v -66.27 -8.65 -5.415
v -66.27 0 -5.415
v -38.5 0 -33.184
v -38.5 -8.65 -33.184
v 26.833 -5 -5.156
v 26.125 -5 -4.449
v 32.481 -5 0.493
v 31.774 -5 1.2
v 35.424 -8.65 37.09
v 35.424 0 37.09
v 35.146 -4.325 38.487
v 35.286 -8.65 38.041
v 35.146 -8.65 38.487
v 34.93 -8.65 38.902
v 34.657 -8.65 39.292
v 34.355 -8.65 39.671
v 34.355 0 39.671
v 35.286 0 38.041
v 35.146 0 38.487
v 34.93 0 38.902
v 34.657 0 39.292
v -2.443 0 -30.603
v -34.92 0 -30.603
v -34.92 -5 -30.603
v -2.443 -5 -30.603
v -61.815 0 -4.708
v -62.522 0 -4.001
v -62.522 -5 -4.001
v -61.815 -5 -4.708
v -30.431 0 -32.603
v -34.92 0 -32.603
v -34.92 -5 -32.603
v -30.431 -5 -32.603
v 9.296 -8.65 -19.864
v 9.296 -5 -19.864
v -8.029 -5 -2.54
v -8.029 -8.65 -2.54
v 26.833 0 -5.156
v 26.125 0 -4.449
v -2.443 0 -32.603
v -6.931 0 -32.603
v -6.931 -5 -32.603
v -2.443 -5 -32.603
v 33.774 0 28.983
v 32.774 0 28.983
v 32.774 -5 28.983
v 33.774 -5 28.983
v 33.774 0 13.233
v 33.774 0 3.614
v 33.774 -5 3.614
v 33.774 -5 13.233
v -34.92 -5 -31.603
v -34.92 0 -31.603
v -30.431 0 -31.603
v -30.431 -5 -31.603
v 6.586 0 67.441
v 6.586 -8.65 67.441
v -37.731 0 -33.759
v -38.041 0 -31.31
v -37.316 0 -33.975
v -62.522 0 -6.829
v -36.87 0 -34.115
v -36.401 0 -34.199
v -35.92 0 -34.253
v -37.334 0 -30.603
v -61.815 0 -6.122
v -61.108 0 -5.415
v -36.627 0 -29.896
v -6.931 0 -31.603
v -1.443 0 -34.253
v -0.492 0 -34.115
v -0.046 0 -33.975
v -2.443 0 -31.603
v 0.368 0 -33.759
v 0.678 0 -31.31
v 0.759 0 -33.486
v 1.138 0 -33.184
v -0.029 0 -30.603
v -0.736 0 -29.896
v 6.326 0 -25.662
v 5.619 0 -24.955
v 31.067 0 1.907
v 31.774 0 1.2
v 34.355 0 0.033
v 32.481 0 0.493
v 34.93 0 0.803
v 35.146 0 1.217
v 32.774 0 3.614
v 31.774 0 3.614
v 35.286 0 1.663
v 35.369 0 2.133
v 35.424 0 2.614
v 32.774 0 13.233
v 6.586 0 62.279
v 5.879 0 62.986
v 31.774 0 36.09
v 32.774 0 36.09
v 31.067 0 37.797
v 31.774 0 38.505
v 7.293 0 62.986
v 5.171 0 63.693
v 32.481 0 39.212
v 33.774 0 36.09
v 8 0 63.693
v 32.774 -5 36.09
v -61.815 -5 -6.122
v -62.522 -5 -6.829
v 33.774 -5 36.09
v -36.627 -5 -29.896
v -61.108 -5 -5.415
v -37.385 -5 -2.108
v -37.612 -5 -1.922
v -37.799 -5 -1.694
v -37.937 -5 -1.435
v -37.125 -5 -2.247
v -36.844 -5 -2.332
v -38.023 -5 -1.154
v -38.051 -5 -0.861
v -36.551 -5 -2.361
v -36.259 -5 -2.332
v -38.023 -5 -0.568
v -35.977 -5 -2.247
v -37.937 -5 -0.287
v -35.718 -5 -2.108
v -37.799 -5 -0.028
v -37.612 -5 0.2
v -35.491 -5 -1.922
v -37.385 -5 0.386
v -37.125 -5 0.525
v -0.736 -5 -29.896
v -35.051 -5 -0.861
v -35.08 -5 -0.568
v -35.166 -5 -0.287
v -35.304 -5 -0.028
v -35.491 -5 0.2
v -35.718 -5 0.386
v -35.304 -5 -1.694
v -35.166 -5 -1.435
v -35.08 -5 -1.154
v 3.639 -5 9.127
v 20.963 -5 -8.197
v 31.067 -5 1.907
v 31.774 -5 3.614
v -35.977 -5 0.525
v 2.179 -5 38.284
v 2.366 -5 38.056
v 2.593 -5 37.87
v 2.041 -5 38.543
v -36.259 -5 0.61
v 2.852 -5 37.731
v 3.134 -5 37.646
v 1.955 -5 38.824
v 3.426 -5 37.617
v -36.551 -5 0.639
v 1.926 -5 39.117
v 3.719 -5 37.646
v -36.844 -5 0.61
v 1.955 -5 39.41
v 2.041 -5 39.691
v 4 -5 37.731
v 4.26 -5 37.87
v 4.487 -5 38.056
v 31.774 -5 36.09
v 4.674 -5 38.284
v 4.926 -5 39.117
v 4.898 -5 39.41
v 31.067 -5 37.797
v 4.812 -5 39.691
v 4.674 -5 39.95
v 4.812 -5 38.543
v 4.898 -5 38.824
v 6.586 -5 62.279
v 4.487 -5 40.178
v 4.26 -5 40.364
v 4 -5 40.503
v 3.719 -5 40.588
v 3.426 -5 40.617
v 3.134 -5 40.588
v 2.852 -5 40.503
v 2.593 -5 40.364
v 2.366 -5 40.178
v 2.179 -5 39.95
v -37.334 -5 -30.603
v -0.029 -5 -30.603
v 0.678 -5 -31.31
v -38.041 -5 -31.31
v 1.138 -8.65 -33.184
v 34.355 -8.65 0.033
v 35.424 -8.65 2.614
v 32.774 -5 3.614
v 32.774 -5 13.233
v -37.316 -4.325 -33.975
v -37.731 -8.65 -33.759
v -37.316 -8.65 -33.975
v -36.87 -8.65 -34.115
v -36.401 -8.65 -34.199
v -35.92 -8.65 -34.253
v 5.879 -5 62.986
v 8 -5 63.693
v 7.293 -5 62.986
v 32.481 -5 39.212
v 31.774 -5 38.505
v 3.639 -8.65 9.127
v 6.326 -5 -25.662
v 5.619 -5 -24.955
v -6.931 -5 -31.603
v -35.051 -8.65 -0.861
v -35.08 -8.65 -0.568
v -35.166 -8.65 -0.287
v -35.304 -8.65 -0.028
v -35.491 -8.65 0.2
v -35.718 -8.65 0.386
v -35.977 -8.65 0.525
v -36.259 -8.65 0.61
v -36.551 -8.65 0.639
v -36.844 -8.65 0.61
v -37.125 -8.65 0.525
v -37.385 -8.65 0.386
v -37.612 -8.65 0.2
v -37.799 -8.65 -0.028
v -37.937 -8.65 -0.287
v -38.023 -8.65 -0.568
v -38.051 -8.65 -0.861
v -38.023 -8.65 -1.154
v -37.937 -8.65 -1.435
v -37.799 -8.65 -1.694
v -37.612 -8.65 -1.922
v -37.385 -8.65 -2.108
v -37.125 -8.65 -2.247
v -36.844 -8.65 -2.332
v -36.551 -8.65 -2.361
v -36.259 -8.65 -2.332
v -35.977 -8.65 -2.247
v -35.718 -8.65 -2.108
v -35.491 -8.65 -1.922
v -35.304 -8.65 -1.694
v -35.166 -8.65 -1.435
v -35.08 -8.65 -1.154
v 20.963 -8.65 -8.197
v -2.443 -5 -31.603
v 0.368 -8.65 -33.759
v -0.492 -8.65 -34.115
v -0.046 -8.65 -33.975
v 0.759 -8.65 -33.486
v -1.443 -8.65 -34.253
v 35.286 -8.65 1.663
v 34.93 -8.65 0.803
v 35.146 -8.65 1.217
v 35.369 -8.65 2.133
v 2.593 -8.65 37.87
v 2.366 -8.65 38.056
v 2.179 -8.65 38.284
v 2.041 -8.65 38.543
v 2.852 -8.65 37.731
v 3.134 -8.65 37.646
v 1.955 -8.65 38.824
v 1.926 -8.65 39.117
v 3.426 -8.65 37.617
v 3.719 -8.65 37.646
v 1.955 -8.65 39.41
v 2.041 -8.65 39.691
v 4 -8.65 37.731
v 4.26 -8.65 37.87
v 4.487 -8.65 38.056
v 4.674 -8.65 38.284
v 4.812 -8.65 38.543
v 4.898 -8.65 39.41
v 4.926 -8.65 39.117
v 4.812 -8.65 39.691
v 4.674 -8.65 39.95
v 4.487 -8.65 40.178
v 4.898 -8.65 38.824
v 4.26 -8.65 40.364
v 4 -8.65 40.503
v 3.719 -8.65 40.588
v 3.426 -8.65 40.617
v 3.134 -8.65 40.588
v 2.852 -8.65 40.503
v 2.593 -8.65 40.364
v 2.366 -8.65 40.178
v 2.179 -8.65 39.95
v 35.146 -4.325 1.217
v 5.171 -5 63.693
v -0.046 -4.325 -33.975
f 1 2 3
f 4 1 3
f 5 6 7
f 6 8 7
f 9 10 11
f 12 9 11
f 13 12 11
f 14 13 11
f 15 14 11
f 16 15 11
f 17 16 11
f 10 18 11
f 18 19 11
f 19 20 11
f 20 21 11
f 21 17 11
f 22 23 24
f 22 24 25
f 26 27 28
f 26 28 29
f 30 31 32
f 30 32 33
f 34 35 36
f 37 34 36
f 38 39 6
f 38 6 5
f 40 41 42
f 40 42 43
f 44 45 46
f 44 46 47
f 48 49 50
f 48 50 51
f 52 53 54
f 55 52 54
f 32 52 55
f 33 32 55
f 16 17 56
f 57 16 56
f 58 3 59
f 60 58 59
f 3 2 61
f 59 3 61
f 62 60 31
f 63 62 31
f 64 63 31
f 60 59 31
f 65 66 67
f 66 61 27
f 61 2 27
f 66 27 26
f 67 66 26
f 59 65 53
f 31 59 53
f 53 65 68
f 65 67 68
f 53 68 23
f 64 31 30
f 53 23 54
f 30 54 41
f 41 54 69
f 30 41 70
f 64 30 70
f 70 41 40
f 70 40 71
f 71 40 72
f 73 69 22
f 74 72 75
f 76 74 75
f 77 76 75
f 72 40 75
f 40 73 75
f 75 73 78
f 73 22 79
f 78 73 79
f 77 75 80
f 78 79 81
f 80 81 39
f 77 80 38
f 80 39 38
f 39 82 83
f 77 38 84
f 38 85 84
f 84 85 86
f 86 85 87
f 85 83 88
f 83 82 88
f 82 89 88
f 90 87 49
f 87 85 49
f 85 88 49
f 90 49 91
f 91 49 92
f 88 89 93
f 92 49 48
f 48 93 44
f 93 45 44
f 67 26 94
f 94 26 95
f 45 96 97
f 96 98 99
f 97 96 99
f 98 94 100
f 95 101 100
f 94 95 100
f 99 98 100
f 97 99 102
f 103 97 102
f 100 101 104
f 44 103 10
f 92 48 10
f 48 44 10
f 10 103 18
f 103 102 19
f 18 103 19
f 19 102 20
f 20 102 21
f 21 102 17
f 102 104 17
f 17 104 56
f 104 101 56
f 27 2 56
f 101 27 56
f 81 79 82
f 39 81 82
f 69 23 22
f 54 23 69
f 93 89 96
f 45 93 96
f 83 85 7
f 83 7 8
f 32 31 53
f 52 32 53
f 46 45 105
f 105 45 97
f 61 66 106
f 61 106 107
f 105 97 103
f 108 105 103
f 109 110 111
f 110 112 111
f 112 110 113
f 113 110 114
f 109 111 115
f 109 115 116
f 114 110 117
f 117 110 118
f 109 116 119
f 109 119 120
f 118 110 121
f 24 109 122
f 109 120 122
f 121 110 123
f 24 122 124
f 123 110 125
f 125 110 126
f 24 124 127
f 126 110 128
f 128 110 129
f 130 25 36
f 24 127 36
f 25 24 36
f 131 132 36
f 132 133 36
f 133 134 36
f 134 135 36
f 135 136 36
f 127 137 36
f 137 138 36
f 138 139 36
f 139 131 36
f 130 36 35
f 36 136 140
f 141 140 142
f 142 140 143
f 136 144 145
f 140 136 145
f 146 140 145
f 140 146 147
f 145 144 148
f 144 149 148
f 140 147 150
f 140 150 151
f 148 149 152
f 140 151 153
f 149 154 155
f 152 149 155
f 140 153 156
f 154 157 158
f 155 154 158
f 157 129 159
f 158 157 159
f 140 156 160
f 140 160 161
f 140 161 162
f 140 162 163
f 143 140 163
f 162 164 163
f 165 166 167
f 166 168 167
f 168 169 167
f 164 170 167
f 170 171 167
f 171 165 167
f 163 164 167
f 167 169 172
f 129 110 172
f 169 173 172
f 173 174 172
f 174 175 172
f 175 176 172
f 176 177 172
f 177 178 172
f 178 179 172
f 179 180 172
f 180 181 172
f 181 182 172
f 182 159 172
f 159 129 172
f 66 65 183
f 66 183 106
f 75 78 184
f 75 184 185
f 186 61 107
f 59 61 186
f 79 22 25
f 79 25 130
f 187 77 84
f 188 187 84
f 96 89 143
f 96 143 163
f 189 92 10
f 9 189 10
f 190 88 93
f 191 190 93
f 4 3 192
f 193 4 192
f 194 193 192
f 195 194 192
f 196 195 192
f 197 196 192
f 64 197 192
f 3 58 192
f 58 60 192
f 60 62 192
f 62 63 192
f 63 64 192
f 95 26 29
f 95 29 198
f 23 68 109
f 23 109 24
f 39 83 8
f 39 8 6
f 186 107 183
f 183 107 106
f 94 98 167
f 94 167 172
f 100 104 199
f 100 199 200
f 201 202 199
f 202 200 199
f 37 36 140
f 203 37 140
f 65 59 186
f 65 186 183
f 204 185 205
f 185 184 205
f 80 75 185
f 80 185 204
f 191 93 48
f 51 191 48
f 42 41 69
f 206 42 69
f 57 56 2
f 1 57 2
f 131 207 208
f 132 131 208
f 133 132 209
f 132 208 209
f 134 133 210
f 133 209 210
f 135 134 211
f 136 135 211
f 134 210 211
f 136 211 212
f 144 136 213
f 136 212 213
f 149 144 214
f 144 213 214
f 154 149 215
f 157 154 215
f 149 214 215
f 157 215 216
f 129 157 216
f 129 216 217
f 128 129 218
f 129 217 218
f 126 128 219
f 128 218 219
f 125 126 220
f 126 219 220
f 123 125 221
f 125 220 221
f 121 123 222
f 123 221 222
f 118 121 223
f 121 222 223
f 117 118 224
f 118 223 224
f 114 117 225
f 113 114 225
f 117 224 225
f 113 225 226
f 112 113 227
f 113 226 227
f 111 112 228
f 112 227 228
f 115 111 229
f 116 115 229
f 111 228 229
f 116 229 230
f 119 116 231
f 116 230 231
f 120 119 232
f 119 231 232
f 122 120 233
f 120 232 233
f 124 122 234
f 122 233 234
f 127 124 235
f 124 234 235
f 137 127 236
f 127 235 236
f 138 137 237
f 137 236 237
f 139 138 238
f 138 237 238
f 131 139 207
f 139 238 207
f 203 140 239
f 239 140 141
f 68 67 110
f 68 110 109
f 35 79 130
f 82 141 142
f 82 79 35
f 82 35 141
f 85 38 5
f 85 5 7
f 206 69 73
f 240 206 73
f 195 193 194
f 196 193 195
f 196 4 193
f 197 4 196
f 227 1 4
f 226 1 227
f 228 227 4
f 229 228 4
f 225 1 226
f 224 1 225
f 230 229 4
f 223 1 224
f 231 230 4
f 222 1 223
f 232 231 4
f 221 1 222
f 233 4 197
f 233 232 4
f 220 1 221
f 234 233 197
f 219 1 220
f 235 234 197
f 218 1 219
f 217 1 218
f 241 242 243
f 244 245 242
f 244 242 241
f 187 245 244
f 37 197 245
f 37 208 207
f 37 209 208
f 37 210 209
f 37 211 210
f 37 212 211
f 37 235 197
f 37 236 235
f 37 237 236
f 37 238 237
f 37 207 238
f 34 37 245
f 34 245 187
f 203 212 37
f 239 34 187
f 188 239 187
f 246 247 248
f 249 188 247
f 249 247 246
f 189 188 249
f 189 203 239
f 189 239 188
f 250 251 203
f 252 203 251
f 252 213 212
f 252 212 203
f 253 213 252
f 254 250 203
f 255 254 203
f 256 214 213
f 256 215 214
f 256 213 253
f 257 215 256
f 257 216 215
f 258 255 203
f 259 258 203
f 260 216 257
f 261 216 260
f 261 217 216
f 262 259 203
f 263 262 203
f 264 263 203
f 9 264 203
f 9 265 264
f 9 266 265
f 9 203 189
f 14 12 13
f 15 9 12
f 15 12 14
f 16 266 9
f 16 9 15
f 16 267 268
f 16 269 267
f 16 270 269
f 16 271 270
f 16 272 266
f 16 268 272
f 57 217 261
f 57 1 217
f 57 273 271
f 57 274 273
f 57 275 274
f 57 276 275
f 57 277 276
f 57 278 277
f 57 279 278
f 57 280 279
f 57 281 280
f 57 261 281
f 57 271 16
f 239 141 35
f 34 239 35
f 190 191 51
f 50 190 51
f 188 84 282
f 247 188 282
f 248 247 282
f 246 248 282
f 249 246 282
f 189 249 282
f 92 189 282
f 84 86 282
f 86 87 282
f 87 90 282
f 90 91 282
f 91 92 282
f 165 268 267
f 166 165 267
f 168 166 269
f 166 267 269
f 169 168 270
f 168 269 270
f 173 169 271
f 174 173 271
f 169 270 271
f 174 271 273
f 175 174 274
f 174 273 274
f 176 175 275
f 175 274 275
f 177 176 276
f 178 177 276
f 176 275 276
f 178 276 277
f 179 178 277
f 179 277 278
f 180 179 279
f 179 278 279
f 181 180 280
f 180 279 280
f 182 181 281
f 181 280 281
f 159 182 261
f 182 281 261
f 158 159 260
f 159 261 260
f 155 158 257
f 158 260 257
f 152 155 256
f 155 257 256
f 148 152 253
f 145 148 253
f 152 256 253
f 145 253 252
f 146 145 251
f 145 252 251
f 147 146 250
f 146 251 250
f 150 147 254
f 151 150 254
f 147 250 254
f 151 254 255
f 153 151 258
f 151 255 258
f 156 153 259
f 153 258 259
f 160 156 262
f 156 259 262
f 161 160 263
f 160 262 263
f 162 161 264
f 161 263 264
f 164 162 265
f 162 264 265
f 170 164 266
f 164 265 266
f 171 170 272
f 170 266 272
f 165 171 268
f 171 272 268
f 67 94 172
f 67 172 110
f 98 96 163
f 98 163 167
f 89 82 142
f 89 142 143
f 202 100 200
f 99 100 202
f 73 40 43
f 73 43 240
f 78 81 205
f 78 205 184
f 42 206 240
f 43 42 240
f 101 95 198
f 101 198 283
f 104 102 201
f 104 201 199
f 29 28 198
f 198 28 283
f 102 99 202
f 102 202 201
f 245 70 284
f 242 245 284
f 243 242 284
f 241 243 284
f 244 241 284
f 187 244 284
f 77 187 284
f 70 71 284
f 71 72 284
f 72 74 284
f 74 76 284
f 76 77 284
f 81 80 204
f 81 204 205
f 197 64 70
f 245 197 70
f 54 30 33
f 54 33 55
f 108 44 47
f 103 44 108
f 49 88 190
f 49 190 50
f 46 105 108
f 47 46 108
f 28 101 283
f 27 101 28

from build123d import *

# Parameters (mm, degrees)
F0_W     = 4.4881204973
F0_H     = 1
F0_W_2   = 1
F0_H_2   = 9.6190602487
F0_H_3   = 7.107180746
F1_DEPTH = 8.65
F2_DEPTH = 5
F3_DEPTH = 5
F5_DEPTH = 3.65
F6_R     = 1.5
F7_DEPTH = 3.65


with BuildPart() as f1:
    # F0 (on Front) → F1 (new body)
    with BuildSketch(Plane.XZ):
        with BuildLine():
            Line((34.3548780517, 39.6712920324), (6.5856519265, 67.4405181576))
            Line((6.5856519265, 67.4405181576), (-66.2696871329, -5.4148209018))
            Line((-66.2696871329, -5.4148209018), (-38.5004610077, -33.1840470269))
            add(Edge.make_bspline(
                [(-38.5004610077, -33.1840470269), (-38.1234667087, -33.490568944), (-37.3694781107, -34.1036127783), (-36.4028402078, -34.2032757765), (-35.9195212563, -34.2531072756)],
                knots=[0, 0, 0, 0, 0.5, 1, 1, 1, 1], degree=3))
            Line((-35.9195212563, -34.2531072756), (-1.4432802617, -34.2531072756))
            add(Edge.make_bspline(
                [(-1.4432802617, -34.2531072756), (-0.9599613102, -34.2032757765), (0.0066765927, -34.1036127783), (0.7606651907, -33.490568944), (1.1376594897, -33.1840470269)],
                knots=[0, 0, 0, 0, 0.5, 1, 1, 1, 1], degree=3))
            Line((1.1376594897, -33.1840470269), (17.7462687707, -16.5754377459))
            Line((17.7462687707, -16.5754377459), (34.3548780517, 0.0331715351))
            add(Edge.make_bspline(
                [(34.3548780517, 0.0331715351), (34.6613999688, 0.4101658341), (35.274443803, 1.164154432), (35.3741068012, 2.1307923349), (35.4239383003, 2.6141112864)],
                knots=[0, 0, 0, 0, 0.5, 1, 1, 1, 1], degree=3))
            Line((35.4239383003, 2.6141112864), (35.4239383003, 37.0903522811))
            add(Edge.make_bspline(
                [(35.4239383003, 37.0903522811), (35.3741068012, 37.5736712325), (35.274443803, 38.5403091354), (34.6613999688, 39.2942977334), (34.3548780517, 39.6712920324)],
                knots=[0, 0, 0, 0, 0.5, 1, 1, 1, 1], degree=3))
        make_face()
        Polygon((-61.8149144114, -6.1219276829), (-37.3337348187, -30.6031072756), (-38.0408415999, -31.3102140568), (-62.5220211925, -6.8290344641), align=None, mode=Mode.SUBTRACT)
        with Locations((-32.6754610077, -32.1031072756)):
            Rectangle(F0_W, F0_H, mode=Mode.SUBTRACT)
        with Locations((-4.6873405103, -32.1031072756)):
            Rectangle(F0_W, F0_H, mode=Mode.SUBTRACT)
        Polygon((5.6193874733, -24.954653103), (6.3264942545, -25.6617598842), (0.6780400819, -31.3102140568), (-0.0290666993, -30.6031072756), align=None, mode=Mode.SUBTRACT)
        Polygon((25.4183773465, -3.7414496674), (15.1653290193, -13.9944979946), (-0.7361734805, -29.8960004944), (-2.4432802617, -30.6031072756), (-6.931400759, -30.6031072756), (-30.431400759, -30.6031072756), (-34.9195212563, -30.6031072756), (-36.6266280375, -29.8960004944), (-61.1078076302, -5.4148209018), (6.5856519265, 62.2786386549), (31.0668315191, 37.7974590623), (31.7739383003, 36.0903522811), (31.7739383003, 3.6141112864), (31.0668315191, 1.9070045052), align=None, mode=Mode.SUBTRACT)
        Polygon((32.4810450815, 0.4927909428), (26.8325909089, -5.1556632298), (26.1254841277, -4.4485564486), (31.7739383003, 1.199897724), align=None, mode=Mode.SUBTRACT)
        with Locations((33.2739383003, 8.4236414107)):
            Rectangle(F0_W_2, F0_H_2, mode=Mode.SUBTRACT)
        Polygon((-62.5220211926, -4.0006073394), (5.1714383642, 63.6928522173), (5.8785451453, 62.9857454361), (-61.8149144114, -4.7077141206), align=None, mode=Mode.SUBTRACT)
        with Locations((33.2739383003, 32.5367619081)):
            Rectangle(F0_W_2, F0_H_3, mode=Mode.SUBTRACT)
        Polygon((7.9998654889, 63.6928522172), (32.4810450815, 39.2116726246), (31.7739383003, 38.5045658435), (7.2927587077, 62.9857454361), align=None, mode=Mode.SUBTRACT)
        Polygon((-0.7361734805, -29.8960004944), (15.1653290193, -13.9944979946), (25.4183773465, -3.7414496674), (31.0668315191, 1.9070045052), (31.7739383003, 3.6141112864), (31.7739383003, 36.0903522811), (31.0668315191, 37.7974590623), (6.5856519265, 62.2786386549), (-61.1078076302, -5.4148209018), (-36.6266280375, -29.8960004944), (-34.9195212563, -30.6031072756), (-30.431400759, -30.6031072756), (-6.931400759, -30.6031072756), (-2.4432802617, -30.6031072756), align=None)
        Polygon((5.8785451453, 62.9857454361), (5.1714383642, 63.6928522173), (-62.5220211926, -4.0006073394), (-61.8149144114, -4.7077141206), align=None)
        Polygon((31.7739383003, 38.5045658435), (32.4810450815, 39.2116726246), (7.9998654889, 63.6928522172), (7.2927587077, 62.9857454361), align=None)
        Polygon((-38.0408415999, -31.3102140568), (-37.3337348187, -30.6031072756), (-61.8149144114, -6.1219276829), (-62.5220211925, -6.8290344641), align=None)
        with Locations((33.2739383003, 8.4236414107)):
            Rectangle(F0_W_2, F0_H_2)
        Polygon((26.1254841277, -4.4485564486), (26.8325909089, -5.1556632298), (32.4810450815, 0.4927909428), (31.7739383003, 1.199897724), align=None)
        Polygon((0.6780400819, -31.3102140568), (6.3264942545, -25.6617598842), (5.6193874733, -24.954653103), (-0.0290666993, -30.6031072756), align=None)
        with Locations((33.2739383003, 32.5367619081)):
            Rectangle(F0_W_2, F0_H_3)
        with Locations((-4.6873405103, -32.1031072756)):
            Rectangle(F0_W, F0_H)
        with Locations((-32.6754610077, -32.1031072756)):
            Rectangle(F0_W, F0_H)
    extrude(amount=F1_DEPTH)

    # F0 (on Front) → F2 (cut)
    with BuildSketch(Plane.XZ):
        Polygon((-0.7361734805, -29.8960004944), (15.1653290193, -13.9944979946), (25.4183773465, -3.7414496674), (31.0668315191, 1.9070045052), (31.7739383003, 3.6141112864), (31.7739383003, 36.0903522811), (31.0668315191, 37.7974590623), (6.5856519265, 62.2786386549), (-61.1078076302, -5.4148209018), (-36.6266280375, -29.8960004944), (-34.9195212563, -30.6031072756), (-30.431400759, -30.6031072756), (-6.931400759, -30.6031072756), (-2.4432802617, -30.6031072756), align=None)
    extrude(amount=F2_DEPTH, mode=Mode.SUBTRACT)

    # F0 (on Front) → F3 (cut)
    with BuildSketch(Plane.XZ):
        Polygon((31.7739383003, 38.5045658435), (32.4810450815, 39.2116726246), (7.9998654889, 63.6928522172), (7.2927587077, 62.9857454361), align=None)
        Polygon((5.8785451453, 62.9857454361), (5.1714383642, 63.6928522173), (-62.5220211926, -4.0006073394), (-61.8149144114, -4.7077141206), align=None)
        Polygon((-38.0408415999, -31.3102140568), (-37.3337348187, -30.6031072756), (-61.8149144114, -6.1219276829), (-62.5220211925, -6.8290344641), align=None)
        with Locations((-32.6754610077, -32.1031072756)):
            Rectangle(F0_W, F0_H)
        with Locations((-4.6873405103, -32.1031072756)):
            Rectangle(F0_W, F0_H)
        Polygon((0.6780400819, -31.3102140568), (6.3264942545, -25.6617598842), (5.6193874733, -24.954653103), (-0.0290666993, -30.6031072756), align=None)
        Polygon((26.1254841277, -4.4485564486), (26.8325909089, -5.1556632298), (32.4810450815, 0.4927909428), (31.7739383003, 1.199897724), align=None)
        with Locations((33.2739383003, 8.4236414107)):
            Rectangle(F0_W_2, F0_H_2)
        with Locations((33.2739383003, 32.5367619081)):
            Rectangle(F0_W_2, F0_H_3)
    extrude(amount=F3_DEPTH, mode=Mode.SUBTRACT)

    # F4 (on face) → F5 (cut, through all)
    with BuildSketch(Plane(origin=(0, -5, 0), x_dir=(-1, 0, 0), z_dir=(0, 1, 0))):
        Polygon((-3.6387139853, 9.1271192495), (-20.9628301244, -8.1969968896), (-9.2955682348, -19.8642587791), (8.0285479043, -2.5401426401), align=None)
    extrude(amount=-F5_DEPTH, mode=Mode.SUBTRACT)

    # F6 (on face) → F7 (cut, through all)
    with BuildSketch(Plane.XZ.offset(8.65)):
        with Locations((3.4263458096, 39.1169224389)):
            Circle(F6_R)
        with Locations((-36.5514419514, -0.8608653222)):
            Circle(F6_R)
    extrude(amount=-F7_DEPTH, mode=Mode.SUBTRACT)


solid = f1.part
